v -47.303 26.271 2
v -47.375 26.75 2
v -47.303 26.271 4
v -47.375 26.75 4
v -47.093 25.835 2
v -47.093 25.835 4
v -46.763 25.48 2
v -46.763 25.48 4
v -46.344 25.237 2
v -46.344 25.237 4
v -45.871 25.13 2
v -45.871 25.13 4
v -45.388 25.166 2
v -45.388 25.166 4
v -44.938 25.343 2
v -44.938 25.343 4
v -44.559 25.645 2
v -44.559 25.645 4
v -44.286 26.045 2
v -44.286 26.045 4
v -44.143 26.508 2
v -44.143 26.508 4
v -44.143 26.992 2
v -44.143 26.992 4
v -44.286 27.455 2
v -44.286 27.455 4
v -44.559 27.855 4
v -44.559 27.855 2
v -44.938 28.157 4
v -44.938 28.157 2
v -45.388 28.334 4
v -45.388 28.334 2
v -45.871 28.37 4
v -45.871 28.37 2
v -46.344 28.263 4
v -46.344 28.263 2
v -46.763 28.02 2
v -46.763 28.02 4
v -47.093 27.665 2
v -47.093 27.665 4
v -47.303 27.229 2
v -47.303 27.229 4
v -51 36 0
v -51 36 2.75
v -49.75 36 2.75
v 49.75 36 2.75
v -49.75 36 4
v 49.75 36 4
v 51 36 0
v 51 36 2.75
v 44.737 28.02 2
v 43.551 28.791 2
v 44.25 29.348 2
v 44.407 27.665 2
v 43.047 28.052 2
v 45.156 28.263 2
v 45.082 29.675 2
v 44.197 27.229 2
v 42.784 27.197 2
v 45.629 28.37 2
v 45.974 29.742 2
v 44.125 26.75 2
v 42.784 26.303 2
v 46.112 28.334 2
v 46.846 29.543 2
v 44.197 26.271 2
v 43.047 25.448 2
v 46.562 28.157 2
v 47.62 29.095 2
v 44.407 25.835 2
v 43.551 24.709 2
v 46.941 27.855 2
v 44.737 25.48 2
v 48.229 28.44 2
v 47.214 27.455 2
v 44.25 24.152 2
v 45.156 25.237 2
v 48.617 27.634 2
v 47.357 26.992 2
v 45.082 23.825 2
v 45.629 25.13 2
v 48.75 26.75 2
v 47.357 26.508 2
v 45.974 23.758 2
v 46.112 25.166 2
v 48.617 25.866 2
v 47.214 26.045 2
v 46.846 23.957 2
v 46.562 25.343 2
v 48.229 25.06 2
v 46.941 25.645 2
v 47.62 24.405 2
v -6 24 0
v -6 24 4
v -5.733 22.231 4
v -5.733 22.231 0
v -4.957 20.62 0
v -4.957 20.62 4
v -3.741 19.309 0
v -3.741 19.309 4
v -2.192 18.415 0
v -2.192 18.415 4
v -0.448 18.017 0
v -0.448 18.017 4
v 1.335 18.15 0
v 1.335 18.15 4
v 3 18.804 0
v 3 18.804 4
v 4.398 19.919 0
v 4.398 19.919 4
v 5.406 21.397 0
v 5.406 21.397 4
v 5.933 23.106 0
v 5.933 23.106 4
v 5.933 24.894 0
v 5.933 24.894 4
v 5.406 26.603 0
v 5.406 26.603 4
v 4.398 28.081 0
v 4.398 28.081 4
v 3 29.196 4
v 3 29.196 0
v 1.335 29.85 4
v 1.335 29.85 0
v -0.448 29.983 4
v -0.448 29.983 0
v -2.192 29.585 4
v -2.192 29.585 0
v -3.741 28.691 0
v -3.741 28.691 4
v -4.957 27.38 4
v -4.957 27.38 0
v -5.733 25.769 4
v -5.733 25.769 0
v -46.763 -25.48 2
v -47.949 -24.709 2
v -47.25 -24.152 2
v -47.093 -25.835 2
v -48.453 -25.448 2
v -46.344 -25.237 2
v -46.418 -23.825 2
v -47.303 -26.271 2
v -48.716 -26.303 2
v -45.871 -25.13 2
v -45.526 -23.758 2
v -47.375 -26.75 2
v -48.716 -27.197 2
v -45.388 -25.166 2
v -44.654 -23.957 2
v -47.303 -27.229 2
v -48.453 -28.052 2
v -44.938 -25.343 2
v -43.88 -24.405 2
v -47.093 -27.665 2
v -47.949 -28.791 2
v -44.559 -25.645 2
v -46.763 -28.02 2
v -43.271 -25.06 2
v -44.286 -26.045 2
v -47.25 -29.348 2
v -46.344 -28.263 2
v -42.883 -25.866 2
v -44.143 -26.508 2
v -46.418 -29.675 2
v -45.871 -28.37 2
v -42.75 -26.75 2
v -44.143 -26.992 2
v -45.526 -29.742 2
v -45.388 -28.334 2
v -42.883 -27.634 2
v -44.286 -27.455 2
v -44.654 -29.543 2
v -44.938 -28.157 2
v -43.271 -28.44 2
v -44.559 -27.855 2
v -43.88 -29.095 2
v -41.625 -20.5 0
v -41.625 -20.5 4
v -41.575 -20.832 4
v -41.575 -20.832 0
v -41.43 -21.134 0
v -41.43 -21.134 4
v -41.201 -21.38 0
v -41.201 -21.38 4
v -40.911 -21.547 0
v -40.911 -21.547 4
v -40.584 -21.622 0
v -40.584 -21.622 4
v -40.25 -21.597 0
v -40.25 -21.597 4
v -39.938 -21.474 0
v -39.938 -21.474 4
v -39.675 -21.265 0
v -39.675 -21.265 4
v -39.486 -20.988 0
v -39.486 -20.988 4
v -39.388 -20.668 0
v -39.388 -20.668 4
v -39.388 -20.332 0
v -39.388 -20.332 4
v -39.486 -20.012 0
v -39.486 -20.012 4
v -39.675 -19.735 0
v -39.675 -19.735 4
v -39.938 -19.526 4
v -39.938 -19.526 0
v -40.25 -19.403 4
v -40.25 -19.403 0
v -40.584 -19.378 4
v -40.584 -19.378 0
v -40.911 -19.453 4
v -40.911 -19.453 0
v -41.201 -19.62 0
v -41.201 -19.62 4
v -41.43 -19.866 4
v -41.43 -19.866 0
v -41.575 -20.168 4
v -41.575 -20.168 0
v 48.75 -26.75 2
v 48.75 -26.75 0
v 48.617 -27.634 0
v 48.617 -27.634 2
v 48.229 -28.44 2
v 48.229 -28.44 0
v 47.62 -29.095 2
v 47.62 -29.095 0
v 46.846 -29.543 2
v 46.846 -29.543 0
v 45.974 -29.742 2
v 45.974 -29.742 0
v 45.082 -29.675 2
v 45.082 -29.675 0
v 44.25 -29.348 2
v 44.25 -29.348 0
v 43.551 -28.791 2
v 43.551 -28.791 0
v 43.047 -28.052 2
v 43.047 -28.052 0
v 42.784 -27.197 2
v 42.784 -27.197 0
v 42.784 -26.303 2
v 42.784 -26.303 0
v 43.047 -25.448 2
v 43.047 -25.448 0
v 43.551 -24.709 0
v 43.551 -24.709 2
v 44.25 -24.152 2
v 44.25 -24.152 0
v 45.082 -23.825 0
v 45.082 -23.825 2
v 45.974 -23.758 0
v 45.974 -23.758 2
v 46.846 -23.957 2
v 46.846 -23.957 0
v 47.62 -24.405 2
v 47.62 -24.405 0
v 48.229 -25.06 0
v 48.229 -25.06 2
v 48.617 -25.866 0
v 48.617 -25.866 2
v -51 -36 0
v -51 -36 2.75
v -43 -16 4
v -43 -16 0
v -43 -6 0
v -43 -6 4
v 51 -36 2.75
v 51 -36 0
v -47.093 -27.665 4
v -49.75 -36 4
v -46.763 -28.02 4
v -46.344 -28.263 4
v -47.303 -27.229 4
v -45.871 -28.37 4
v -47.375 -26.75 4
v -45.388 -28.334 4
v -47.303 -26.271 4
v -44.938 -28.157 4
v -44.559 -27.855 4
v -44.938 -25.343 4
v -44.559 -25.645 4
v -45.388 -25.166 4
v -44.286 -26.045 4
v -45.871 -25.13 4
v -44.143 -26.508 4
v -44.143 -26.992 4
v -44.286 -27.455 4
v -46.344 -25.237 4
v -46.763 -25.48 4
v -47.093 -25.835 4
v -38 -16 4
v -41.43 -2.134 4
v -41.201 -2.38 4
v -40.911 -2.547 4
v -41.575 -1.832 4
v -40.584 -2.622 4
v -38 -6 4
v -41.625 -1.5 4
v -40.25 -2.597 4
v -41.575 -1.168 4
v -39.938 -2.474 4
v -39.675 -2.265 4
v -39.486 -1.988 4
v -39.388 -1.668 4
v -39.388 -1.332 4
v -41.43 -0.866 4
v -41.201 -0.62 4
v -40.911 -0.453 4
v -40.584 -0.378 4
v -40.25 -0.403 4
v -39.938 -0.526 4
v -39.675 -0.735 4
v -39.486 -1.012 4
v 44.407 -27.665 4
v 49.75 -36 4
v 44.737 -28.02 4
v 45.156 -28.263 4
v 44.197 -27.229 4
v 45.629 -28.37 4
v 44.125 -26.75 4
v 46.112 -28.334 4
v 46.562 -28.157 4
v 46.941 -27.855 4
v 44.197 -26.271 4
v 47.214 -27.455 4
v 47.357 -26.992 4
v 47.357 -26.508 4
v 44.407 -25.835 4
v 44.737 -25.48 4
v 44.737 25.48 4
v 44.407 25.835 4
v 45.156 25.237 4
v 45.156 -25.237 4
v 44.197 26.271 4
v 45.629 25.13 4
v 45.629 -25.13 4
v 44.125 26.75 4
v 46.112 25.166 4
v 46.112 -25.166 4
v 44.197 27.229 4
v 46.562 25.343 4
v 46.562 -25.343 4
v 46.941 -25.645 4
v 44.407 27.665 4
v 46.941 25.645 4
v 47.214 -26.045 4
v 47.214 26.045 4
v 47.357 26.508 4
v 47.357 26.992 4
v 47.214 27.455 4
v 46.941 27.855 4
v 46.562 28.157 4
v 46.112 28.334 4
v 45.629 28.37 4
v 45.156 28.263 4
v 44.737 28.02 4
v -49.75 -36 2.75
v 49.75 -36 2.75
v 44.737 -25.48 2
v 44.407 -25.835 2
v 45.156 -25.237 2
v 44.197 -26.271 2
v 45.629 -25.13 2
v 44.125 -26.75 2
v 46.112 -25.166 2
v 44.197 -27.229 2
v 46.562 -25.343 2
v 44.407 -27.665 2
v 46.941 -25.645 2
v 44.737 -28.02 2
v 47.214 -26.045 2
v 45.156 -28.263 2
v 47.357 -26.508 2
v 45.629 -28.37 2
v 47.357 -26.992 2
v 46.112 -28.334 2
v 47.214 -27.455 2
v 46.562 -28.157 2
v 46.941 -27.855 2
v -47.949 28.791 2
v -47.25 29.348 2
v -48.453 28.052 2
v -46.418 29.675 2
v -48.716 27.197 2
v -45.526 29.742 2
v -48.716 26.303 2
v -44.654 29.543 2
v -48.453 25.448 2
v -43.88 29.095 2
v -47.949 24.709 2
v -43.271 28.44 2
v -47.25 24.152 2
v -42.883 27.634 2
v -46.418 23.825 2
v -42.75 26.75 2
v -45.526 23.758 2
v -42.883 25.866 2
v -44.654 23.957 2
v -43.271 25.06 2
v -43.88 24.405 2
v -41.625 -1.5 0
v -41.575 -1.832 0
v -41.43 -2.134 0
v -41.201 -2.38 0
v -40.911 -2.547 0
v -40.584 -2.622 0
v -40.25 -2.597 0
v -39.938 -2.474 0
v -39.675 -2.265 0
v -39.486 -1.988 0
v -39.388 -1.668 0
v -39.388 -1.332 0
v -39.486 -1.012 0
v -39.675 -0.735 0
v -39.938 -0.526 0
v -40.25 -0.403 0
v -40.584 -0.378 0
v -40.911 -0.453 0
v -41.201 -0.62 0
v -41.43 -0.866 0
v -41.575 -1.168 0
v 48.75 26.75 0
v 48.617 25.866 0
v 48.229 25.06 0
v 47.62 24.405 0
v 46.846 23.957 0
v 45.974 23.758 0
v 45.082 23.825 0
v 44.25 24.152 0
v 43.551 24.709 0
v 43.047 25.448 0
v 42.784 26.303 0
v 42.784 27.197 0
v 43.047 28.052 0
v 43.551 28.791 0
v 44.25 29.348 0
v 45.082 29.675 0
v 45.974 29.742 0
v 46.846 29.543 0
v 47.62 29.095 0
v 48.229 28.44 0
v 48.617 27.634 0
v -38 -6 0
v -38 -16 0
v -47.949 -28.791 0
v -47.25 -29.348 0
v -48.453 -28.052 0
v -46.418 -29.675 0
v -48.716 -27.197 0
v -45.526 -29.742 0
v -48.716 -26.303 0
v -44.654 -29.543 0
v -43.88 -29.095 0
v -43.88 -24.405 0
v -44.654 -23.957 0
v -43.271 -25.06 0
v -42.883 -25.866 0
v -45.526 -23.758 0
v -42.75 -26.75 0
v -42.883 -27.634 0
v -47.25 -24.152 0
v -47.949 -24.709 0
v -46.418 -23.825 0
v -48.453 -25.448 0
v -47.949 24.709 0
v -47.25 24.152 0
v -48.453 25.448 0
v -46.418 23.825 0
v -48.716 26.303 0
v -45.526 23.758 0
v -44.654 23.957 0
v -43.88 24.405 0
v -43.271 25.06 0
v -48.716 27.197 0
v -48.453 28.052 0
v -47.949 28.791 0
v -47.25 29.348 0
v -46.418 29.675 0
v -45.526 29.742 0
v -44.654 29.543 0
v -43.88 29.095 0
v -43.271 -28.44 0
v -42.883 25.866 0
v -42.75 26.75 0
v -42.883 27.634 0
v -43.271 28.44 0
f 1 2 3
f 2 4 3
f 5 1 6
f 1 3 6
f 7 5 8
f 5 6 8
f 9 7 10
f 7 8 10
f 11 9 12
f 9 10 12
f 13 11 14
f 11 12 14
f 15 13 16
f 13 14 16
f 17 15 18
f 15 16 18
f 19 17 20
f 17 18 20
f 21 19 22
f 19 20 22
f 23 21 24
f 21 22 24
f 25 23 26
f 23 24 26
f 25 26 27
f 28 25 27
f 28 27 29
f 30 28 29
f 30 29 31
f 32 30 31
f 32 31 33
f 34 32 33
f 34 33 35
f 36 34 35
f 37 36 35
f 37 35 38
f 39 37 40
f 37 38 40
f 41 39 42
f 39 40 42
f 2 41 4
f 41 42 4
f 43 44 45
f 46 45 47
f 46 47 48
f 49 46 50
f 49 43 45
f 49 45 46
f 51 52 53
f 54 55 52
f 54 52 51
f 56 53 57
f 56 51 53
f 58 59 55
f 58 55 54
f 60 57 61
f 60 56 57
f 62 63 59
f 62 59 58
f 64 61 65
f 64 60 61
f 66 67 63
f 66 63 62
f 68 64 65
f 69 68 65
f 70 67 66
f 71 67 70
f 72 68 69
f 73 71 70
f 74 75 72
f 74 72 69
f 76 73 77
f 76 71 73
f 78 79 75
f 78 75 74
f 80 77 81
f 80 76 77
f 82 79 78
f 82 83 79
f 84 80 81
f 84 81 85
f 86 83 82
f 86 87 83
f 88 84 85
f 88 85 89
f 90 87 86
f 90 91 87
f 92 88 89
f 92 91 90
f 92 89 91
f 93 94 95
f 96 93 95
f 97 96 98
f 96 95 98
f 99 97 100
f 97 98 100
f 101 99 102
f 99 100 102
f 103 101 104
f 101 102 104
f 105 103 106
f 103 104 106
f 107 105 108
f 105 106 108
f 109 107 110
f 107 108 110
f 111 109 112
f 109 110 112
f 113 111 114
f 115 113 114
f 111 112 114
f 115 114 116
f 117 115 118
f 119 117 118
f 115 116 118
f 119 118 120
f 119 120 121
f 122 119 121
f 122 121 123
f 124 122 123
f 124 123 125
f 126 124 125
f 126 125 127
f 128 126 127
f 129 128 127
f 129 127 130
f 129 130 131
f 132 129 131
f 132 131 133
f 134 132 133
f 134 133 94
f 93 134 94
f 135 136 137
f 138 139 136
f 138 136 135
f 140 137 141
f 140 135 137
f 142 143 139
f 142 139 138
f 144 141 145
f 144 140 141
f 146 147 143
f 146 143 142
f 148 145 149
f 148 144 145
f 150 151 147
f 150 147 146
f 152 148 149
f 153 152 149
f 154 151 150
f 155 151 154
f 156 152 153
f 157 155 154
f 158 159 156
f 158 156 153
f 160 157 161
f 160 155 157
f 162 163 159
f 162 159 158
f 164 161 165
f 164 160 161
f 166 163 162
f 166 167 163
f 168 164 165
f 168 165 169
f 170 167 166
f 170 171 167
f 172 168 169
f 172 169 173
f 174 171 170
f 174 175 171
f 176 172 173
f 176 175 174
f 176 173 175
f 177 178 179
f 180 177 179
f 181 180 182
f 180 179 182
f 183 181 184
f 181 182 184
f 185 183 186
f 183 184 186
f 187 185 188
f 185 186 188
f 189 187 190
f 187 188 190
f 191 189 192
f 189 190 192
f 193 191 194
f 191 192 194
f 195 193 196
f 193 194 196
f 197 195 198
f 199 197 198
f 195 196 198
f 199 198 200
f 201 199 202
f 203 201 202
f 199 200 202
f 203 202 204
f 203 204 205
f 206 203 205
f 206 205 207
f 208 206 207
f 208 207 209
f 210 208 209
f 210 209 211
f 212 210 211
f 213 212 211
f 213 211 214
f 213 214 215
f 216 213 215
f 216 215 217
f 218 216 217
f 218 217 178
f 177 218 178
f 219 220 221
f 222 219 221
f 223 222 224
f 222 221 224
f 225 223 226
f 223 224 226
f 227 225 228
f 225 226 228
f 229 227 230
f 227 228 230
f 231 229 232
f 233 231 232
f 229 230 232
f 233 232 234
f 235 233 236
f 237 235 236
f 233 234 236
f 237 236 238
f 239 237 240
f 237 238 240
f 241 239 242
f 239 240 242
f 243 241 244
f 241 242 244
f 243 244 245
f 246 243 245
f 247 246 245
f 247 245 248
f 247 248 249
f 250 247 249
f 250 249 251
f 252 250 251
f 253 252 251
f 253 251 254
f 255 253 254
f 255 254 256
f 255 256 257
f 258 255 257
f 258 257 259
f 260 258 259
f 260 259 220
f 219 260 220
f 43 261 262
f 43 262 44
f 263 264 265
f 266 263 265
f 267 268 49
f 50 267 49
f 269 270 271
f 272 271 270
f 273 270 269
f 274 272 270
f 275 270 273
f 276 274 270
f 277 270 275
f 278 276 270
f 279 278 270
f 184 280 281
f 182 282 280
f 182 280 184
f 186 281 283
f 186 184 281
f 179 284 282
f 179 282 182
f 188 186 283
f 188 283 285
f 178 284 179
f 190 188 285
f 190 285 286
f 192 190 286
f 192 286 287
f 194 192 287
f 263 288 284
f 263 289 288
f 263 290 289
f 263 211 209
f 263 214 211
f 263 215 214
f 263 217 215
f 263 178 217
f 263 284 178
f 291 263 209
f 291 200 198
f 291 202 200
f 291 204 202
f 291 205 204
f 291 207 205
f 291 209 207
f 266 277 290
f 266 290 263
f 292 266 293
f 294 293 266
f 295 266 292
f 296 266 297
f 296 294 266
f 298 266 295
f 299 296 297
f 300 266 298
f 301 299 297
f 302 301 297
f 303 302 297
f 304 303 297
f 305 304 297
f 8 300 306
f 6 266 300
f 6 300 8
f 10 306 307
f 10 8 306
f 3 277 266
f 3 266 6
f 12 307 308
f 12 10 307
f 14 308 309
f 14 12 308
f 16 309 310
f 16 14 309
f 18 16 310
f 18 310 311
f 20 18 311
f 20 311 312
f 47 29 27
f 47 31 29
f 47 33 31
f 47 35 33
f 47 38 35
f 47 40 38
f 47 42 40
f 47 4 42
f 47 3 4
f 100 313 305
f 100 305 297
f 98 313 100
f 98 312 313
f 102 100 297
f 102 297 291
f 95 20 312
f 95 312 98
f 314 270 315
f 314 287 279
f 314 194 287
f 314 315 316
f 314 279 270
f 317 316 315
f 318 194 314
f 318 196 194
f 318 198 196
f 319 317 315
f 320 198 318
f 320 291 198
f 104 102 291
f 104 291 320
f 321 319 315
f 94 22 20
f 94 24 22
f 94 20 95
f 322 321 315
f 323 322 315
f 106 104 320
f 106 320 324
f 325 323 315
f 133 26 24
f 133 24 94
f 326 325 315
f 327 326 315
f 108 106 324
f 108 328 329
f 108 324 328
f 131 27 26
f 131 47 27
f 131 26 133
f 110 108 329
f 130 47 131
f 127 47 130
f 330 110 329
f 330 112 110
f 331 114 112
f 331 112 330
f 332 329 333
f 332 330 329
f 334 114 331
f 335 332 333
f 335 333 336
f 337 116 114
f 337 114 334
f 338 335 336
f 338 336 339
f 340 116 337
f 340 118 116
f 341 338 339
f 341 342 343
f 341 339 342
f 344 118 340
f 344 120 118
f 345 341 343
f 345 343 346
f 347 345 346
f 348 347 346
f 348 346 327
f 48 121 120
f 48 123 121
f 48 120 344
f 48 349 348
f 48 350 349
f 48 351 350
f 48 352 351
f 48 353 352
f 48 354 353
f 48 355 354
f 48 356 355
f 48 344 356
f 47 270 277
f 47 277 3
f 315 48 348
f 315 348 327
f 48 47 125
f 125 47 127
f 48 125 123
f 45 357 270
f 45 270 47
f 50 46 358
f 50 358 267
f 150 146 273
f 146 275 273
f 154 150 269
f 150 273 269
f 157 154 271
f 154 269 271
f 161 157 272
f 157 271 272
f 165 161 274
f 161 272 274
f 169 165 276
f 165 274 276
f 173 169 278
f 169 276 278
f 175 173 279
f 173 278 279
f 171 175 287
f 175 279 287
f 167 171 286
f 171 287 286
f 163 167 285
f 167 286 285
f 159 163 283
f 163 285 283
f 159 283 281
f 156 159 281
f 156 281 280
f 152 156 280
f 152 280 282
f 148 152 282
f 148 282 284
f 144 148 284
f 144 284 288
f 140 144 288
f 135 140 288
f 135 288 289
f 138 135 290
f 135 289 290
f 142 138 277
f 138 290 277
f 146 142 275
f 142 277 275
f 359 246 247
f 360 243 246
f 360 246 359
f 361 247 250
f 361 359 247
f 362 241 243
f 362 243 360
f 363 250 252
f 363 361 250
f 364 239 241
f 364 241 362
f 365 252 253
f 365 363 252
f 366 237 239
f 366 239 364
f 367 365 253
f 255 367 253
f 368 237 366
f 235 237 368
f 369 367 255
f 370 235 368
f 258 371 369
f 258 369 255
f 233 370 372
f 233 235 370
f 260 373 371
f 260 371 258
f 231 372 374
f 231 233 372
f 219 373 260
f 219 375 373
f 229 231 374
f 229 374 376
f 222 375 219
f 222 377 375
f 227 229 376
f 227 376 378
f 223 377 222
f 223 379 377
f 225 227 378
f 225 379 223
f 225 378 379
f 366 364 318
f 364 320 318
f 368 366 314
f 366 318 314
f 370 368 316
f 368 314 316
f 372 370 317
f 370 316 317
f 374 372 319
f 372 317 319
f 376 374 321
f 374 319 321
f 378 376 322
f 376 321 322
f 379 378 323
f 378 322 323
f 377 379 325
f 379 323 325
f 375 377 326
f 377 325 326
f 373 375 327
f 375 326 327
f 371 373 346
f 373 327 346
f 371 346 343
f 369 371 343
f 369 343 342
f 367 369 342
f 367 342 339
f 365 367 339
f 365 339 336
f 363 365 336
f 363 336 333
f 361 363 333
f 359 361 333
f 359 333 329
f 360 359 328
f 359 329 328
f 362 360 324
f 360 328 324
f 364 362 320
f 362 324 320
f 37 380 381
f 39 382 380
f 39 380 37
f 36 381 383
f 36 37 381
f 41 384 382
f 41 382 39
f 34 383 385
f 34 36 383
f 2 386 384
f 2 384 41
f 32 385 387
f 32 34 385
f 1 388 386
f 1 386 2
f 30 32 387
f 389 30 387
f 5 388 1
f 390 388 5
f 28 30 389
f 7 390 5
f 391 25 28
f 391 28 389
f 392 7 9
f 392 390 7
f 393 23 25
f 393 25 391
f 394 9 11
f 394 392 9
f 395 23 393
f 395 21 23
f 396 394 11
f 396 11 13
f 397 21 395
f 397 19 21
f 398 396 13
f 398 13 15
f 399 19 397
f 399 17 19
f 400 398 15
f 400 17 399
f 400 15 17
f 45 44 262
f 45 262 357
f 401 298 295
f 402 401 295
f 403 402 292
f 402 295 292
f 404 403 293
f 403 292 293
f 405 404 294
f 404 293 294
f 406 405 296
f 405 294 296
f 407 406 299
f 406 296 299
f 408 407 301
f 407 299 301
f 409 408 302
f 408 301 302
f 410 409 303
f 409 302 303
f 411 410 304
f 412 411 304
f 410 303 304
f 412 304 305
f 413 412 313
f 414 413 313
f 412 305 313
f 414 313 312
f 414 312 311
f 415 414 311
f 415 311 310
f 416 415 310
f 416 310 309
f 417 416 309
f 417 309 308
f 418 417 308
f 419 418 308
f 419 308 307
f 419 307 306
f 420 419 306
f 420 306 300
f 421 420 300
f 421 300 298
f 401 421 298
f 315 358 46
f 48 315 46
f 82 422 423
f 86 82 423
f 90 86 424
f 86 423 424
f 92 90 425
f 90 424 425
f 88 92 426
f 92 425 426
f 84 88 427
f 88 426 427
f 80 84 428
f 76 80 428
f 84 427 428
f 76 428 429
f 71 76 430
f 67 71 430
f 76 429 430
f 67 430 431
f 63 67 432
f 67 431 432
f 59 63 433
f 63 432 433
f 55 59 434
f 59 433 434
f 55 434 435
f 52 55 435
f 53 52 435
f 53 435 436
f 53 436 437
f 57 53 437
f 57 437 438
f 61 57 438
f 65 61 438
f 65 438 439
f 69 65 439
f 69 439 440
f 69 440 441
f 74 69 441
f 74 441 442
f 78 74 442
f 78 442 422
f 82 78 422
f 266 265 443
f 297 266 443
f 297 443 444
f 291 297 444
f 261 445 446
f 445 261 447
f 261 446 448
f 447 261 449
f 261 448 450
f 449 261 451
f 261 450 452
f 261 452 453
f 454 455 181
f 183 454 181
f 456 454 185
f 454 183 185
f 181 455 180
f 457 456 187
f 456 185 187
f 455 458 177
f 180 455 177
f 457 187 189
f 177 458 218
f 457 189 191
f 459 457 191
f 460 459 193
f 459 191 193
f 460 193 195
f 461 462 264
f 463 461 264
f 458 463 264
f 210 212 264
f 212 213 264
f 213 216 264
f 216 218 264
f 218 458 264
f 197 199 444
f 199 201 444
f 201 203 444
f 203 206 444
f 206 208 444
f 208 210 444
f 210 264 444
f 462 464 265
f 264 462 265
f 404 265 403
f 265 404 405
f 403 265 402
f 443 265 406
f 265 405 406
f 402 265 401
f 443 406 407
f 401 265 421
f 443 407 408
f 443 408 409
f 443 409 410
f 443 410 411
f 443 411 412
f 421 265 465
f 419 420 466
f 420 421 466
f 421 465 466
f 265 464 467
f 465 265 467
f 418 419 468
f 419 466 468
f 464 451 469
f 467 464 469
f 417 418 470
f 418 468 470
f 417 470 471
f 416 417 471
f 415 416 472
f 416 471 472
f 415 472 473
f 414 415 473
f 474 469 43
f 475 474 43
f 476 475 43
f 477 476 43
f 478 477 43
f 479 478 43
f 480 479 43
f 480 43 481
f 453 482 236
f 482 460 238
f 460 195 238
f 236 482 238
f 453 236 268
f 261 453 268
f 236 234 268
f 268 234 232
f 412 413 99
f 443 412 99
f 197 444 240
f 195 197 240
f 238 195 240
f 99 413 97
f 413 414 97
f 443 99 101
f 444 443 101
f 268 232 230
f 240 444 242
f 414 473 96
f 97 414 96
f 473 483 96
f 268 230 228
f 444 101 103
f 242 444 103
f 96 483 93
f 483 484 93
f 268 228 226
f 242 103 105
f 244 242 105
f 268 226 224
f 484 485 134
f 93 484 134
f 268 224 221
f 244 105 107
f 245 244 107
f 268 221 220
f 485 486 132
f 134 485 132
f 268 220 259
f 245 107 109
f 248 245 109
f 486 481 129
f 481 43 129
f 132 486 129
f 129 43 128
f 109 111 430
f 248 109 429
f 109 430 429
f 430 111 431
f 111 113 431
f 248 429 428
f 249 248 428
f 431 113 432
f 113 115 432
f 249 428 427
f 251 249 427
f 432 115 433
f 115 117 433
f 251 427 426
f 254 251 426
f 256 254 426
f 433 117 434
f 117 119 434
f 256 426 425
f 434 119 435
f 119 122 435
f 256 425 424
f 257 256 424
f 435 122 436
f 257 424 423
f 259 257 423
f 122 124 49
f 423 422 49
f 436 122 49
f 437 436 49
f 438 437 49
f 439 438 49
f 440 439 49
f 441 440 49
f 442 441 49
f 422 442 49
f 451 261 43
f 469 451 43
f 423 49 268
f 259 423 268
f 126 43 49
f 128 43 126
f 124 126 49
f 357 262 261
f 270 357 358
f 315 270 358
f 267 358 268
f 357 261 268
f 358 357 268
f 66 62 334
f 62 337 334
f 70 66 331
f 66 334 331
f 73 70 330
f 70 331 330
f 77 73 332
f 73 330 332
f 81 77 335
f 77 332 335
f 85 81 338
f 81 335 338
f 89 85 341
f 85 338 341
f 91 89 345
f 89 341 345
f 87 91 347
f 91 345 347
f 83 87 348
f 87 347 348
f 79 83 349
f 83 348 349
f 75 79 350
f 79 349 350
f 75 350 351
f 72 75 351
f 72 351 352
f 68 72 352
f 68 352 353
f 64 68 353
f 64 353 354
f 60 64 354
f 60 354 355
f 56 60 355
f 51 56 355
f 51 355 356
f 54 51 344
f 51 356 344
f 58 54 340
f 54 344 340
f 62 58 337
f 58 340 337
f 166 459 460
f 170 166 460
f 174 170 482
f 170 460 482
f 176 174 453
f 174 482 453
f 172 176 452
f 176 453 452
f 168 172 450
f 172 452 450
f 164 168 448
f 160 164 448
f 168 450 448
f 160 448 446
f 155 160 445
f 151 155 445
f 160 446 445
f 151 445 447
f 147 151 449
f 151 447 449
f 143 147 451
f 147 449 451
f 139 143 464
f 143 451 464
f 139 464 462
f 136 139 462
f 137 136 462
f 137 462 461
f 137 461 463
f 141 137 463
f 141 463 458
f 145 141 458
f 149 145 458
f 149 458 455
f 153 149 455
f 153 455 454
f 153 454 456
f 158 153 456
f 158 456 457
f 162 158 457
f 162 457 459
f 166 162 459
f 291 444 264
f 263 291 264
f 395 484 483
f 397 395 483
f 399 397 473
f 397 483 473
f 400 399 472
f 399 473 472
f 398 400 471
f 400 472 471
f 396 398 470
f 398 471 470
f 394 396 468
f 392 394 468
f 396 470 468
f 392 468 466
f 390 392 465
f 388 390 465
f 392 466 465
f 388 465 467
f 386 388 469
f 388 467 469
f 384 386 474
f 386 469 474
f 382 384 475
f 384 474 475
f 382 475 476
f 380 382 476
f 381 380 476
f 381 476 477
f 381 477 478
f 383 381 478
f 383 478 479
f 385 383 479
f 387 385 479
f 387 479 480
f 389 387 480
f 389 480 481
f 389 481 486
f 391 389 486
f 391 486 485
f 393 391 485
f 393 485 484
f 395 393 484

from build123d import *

# Parameters (mm, degrees)
F0_W           = 102
F0_H           = 72
F1_DEPTH       = 2.75
F2_W           = 99.5
F2_H           = 72
F3_DEPTH       = 1.25
F5_D           = 3.25
F5_DEPTH       = 8
F5_CBORE_D     = 6
F5_CBORE_DEPTH = 2
F7_DEPTH       = 4
F9_D           = 2.25
F11_D          = 12


with BuildPart() as f1:
    # F0 (on Top) → F1 (new body)
    with BuildSketch(Plane.XY):
        Rectangle(F0_W, F0_H)
    extrude(amount=F1_DEPTH)

    # F2 (on face) → F3 (join)
    with BuildSketch(Plane.XY.offset(2.75)):
        Rectangle(F2_W, F2_H)
    extrude(amount=F3_DEPTH)

    # F5
    with Locations(Plane(origin=(0, 0, 0), x_dir=(1, 0, 0), z_dir=(0, 0, -1))):
        with Locations((-45.75, 26.75), (45.75, 26.75), (45.75, -26.75), (-45.75, -26.75)):
            CounterBoreHole(F5_D / 2, F5_CBORE_D / 2, F5_CBORE_DEPTH, depth=F5_DEPTH)

    # F6 (on face) → F7 (cut)
    with BuildSketch(Plane(origin=(0, 0, 0), x_dir=(1, 0, 0), z_dir=(0, 0, -1))):
        Polygon((-40.5, 16), (-43, 16), (-43, 6), (-40.5, 6), (-38, 6), (-38, 11), (-38, 16), align=None)
    extrude(amount=-F7_DEPTH, mode=Mode.SUBTRACT)

    # F9 (through all)
    with Locations(Plane(origin=(0, 0, 0), x_dir=(1, 0, 0), z_dir=(0, 0, -1))):
        with Locations((-40.5, 20.5), (-40.5, 1.5)):
            Hole(F9_D / 2)

    # F11 (through all)
    with Locations(Plane(origin=(0, 0, 0), x_dir=(1, 0, 0), z_dir=(0, 0, -1))):
        with Locations((0, -24)):
            Hole(F11_D / 2)


solid = f1.part
